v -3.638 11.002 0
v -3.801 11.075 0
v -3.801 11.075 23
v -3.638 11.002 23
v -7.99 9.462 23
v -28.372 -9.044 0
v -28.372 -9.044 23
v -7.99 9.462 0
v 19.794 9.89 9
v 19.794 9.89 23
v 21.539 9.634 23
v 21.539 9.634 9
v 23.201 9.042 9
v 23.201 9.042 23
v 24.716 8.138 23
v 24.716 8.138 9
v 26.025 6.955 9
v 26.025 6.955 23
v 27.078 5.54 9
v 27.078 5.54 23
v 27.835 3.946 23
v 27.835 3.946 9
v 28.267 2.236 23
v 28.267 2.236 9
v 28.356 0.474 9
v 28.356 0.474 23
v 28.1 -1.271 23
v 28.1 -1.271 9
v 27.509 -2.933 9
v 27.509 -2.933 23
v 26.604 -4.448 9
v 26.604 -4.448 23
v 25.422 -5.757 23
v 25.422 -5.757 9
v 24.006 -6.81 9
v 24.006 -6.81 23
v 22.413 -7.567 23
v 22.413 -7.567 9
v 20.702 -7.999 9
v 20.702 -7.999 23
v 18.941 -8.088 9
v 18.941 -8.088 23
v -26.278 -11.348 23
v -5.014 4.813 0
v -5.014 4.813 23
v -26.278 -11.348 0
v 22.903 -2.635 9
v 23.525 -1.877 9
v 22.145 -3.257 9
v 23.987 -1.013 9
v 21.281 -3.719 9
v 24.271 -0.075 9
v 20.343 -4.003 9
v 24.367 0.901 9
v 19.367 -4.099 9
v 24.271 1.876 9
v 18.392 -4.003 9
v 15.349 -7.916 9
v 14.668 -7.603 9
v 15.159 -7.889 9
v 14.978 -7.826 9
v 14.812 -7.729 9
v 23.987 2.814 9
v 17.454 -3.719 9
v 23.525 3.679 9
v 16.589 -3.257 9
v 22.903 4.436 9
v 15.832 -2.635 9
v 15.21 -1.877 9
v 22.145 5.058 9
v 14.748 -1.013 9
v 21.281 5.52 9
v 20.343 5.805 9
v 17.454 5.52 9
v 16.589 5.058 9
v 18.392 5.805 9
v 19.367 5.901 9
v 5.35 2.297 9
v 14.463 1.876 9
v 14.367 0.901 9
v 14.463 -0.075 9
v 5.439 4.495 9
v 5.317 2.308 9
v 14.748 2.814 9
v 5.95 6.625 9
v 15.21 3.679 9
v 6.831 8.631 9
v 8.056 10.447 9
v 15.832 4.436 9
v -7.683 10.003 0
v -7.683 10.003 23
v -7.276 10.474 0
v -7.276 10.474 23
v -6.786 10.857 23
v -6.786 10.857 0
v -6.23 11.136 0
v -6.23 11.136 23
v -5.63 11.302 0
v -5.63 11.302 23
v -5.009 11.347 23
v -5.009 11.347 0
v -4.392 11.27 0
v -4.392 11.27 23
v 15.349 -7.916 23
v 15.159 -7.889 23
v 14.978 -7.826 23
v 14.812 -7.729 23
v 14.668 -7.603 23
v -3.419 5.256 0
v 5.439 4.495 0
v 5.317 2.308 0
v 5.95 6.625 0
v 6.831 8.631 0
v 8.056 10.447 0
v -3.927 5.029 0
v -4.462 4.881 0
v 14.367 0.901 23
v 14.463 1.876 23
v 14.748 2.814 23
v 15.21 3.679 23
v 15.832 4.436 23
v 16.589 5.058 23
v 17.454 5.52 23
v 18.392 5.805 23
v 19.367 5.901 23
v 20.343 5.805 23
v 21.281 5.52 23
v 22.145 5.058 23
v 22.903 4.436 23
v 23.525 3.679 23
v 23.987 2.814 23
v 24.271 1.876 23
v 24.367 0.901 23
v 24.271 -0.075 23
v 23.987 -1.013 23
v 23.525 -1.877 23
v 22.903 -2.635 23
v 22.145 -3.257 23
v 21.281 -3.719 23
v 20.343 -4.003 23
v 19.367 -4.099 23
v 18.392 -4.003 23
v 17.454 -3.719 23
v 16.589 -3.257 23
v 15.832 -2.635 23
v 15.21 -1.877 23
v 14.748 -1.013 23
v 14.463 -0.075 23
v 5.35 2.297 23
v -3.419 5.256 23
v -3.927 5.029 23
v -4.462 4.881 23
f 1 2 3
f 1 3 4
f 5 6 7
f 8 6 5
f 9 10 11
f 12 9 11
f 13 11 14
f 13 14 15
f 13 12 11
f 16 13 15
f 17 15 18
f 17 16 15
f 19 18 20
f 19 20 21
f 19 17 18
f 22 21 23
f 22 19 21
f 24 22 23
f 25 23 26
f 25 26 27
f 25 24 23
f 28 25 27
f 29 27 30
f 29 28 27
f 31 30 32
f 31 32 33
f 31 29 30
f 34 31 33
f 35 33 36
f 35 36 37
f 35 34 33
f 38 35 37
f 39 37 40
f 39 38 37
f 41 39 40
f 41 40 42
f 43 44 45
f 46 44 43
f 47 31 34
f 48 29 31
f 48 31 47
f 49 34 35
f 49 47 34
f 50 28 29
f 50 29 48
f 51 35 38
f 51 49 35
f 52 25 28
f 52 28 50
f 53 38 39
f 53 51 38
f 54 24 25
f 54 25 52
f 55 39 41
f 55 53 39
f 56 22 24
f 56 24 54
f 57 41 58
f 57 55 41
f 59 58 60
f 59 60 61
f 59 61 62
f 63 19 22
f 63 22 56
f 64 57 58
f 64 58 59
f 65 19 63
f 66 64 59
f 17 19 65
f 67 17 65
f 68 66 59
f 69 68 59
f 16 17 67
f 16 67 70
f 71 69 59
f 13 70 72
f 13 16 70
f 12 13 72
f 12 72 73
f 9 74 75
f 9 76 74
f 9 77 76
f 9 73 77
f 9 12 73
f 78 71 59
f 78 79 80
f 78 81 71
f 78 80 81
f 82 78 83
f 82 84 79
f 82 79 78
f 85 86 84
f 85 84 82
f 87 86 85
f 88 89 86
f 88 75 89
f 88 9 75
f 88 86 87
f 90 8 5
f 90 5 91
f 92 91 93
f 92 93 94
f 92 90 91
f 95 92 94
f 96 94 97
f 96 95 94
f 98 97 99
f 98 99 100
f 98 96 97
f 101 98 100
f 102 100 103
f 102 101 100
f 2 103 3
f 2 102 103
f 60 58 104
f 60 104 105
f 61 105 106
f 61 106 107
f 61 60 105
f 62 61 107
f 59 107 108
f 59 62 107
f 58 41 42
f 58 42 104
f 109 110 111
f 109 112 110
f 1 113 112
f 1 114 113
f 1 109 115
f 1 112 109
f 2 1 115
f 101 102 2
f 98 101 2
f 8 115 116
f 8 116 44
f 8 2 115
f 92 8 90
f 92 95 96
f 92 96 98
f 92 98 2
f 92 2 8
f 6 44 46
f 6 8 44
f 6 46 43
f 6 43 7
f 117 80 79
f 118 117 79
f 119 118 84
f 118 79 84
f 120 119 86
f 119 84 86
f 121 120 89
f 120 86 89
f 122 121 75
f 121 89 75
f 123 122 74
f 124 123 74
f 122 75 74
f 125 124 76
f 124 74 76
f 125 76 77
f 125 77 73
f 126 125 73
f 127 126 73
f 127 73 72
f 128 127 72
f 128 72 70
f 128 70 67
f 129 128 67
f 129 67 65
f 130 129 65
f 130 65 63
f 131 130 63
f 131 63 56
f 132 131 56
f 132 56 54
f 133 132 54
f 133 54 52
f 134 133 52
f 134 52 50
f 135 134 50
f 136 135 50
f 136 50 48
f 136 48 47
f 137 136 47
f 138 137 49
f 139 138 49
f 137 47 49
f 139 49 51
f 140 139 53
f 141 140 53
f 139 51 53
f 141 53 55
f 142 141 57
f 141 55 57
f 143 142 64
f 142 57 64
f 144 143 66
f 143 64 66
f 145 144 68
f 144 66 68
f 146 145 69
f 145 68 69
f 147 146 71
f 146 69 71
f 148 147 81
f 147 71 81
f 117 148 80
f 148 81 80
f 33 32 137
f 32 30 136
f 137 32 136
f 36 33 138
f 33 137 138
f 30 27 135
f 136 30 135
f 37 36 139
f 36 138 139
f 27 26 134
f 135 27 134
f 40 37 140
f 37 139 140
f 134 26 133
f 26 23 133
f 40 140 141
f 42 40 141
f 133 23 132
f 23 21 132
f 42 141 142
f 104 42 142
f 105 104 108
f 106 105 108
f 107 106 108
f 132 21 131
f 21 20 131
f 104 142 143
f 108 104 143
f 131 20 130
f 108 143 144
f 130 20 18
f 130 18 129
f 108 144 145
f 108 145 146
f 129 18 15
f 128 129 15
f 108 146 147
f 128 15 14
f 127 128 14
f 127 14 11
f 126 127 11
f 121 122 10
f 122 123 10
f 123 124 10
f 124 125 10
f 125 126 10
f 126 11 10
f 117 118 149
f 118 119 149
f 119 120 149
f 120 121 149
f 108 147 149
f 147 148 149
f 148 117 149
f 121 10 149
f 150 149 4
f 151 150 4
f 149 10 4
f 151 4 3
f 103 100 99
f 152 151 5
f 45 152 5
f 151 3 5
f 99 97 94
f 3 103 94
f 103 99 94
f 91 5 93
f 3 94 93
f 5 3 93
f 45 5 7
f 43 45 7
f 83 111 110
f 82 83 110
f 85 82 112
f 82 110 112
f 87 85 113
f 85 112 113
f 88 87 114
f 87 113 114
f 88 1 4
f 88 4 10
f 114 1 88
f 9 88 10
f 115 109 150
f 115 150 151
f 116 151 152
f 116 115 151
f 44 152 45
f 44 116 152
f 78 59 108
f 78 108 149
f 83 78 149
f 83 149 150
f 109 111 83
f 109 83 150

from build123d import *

# Parameters (mm, degrees)
BOSS_EXTRUDE1_DEPTH = 23
SKETCH4_R           = 5
CUT_EXTRUDE3_DEPTH  = 28
CUT_EXTRUDE4_DEPTH  = 9


with BuildPart() as part:
    # Sketch1 → Boss-Extrude1 (new body)
    with BuildSketch(Plane.XY):
        with BuildLine():
            Line((-26.278110913, -11.347842937), (-28.372166089, -9.043842083))
            Line((-28.372166089, -9.043842083), (-7.990208081, 9.462215656))
            ThreePointArc((-7.990208081, 9.462215656), (-6.229501786, 11.136017118), (-3.800938061, 11.07456612))
            Line((-3.800938061, 11.07456612), (-3.637536714, 11.001987755))
            Line((-3.637536714, 11.001987755), (19.793985679, 9.88969345))
            ThreePointArc((19.793985679, 9.88969345), (28.356197765, 0.474073738), (18.940578052, -8.088138348))
            Line((18.940578052, -8.088138348), (15.348738563, -7.91649311))
            ThreePointArc((15.348738563, -7.91649311), (14.978028358, -7.825889172), (14.668239185, -7.603030926))
            Line((14.668239185, -7.603030926), (5.35012395, 2.296550983))
            Line((5.35012395, 2.296550983), (-3.419163159, 5.255947346))
            ThreePointArc((-3.419163159, 5.255947346), (-4.191805611, 4.94513719), (-5.014133862, 4.813396687))
            Line((-5.014133862, 4.813396687), (-26.278110913, -11.347842937))
        make_face()
    extrude(amount=BOSS_EXTRUDE1_DEPTH)

    # Sketch4 → Cut-Extrude3 (cut)
    with BuildSketch(Plane(origin=(0, 0, 0), x_dir=(-1, 0, 0), z_dir=(0, 0, -1))):
        with Locations((-19.367281866, 0.900777551)):
            Circle(SKETCH4_R)
    extrude(amount=-CUT_EXTRUDE3_DEPTH, mode=Mode.SUBTRACT)

    # Sketch5 → Cut-Extrude4 (cut)
    with BuildSketch(Plane(origin=(0, 0, 0), x_dir=(-1, 0, 0), z_dir=(0, 0, -1))):
        with BuildLine():
            Line((-8.280771458, 10.715087027), (-20.34194177, 10.142544005))
            ThreePointArc((-20.34194177, 10.142544005), (-28.752978591, 0.302154859), (-18.904257366, -8.099124161))
            Line((-18.904257366, -8.099124161), (-15.316689911, -7.927683074))
            ThreePointArc((-15.316689911, -7.927683074), (-14.945947651, -7.837064321), (-14.636142172, -7.614169396))
            Line((-14.636142172, -7.614169396), (-5.318075302, 2.285361131))
            ThreePointArc((-5.318075302, 2.285361131), (-6.00282629, 6.780194646), (-8.280771458, 10.715087027))
        make_face()
    extrude(amount=-CUT_EXTRUDE4_DEPTH, mode=Mode.SUBTRACT)


solid = part.part
